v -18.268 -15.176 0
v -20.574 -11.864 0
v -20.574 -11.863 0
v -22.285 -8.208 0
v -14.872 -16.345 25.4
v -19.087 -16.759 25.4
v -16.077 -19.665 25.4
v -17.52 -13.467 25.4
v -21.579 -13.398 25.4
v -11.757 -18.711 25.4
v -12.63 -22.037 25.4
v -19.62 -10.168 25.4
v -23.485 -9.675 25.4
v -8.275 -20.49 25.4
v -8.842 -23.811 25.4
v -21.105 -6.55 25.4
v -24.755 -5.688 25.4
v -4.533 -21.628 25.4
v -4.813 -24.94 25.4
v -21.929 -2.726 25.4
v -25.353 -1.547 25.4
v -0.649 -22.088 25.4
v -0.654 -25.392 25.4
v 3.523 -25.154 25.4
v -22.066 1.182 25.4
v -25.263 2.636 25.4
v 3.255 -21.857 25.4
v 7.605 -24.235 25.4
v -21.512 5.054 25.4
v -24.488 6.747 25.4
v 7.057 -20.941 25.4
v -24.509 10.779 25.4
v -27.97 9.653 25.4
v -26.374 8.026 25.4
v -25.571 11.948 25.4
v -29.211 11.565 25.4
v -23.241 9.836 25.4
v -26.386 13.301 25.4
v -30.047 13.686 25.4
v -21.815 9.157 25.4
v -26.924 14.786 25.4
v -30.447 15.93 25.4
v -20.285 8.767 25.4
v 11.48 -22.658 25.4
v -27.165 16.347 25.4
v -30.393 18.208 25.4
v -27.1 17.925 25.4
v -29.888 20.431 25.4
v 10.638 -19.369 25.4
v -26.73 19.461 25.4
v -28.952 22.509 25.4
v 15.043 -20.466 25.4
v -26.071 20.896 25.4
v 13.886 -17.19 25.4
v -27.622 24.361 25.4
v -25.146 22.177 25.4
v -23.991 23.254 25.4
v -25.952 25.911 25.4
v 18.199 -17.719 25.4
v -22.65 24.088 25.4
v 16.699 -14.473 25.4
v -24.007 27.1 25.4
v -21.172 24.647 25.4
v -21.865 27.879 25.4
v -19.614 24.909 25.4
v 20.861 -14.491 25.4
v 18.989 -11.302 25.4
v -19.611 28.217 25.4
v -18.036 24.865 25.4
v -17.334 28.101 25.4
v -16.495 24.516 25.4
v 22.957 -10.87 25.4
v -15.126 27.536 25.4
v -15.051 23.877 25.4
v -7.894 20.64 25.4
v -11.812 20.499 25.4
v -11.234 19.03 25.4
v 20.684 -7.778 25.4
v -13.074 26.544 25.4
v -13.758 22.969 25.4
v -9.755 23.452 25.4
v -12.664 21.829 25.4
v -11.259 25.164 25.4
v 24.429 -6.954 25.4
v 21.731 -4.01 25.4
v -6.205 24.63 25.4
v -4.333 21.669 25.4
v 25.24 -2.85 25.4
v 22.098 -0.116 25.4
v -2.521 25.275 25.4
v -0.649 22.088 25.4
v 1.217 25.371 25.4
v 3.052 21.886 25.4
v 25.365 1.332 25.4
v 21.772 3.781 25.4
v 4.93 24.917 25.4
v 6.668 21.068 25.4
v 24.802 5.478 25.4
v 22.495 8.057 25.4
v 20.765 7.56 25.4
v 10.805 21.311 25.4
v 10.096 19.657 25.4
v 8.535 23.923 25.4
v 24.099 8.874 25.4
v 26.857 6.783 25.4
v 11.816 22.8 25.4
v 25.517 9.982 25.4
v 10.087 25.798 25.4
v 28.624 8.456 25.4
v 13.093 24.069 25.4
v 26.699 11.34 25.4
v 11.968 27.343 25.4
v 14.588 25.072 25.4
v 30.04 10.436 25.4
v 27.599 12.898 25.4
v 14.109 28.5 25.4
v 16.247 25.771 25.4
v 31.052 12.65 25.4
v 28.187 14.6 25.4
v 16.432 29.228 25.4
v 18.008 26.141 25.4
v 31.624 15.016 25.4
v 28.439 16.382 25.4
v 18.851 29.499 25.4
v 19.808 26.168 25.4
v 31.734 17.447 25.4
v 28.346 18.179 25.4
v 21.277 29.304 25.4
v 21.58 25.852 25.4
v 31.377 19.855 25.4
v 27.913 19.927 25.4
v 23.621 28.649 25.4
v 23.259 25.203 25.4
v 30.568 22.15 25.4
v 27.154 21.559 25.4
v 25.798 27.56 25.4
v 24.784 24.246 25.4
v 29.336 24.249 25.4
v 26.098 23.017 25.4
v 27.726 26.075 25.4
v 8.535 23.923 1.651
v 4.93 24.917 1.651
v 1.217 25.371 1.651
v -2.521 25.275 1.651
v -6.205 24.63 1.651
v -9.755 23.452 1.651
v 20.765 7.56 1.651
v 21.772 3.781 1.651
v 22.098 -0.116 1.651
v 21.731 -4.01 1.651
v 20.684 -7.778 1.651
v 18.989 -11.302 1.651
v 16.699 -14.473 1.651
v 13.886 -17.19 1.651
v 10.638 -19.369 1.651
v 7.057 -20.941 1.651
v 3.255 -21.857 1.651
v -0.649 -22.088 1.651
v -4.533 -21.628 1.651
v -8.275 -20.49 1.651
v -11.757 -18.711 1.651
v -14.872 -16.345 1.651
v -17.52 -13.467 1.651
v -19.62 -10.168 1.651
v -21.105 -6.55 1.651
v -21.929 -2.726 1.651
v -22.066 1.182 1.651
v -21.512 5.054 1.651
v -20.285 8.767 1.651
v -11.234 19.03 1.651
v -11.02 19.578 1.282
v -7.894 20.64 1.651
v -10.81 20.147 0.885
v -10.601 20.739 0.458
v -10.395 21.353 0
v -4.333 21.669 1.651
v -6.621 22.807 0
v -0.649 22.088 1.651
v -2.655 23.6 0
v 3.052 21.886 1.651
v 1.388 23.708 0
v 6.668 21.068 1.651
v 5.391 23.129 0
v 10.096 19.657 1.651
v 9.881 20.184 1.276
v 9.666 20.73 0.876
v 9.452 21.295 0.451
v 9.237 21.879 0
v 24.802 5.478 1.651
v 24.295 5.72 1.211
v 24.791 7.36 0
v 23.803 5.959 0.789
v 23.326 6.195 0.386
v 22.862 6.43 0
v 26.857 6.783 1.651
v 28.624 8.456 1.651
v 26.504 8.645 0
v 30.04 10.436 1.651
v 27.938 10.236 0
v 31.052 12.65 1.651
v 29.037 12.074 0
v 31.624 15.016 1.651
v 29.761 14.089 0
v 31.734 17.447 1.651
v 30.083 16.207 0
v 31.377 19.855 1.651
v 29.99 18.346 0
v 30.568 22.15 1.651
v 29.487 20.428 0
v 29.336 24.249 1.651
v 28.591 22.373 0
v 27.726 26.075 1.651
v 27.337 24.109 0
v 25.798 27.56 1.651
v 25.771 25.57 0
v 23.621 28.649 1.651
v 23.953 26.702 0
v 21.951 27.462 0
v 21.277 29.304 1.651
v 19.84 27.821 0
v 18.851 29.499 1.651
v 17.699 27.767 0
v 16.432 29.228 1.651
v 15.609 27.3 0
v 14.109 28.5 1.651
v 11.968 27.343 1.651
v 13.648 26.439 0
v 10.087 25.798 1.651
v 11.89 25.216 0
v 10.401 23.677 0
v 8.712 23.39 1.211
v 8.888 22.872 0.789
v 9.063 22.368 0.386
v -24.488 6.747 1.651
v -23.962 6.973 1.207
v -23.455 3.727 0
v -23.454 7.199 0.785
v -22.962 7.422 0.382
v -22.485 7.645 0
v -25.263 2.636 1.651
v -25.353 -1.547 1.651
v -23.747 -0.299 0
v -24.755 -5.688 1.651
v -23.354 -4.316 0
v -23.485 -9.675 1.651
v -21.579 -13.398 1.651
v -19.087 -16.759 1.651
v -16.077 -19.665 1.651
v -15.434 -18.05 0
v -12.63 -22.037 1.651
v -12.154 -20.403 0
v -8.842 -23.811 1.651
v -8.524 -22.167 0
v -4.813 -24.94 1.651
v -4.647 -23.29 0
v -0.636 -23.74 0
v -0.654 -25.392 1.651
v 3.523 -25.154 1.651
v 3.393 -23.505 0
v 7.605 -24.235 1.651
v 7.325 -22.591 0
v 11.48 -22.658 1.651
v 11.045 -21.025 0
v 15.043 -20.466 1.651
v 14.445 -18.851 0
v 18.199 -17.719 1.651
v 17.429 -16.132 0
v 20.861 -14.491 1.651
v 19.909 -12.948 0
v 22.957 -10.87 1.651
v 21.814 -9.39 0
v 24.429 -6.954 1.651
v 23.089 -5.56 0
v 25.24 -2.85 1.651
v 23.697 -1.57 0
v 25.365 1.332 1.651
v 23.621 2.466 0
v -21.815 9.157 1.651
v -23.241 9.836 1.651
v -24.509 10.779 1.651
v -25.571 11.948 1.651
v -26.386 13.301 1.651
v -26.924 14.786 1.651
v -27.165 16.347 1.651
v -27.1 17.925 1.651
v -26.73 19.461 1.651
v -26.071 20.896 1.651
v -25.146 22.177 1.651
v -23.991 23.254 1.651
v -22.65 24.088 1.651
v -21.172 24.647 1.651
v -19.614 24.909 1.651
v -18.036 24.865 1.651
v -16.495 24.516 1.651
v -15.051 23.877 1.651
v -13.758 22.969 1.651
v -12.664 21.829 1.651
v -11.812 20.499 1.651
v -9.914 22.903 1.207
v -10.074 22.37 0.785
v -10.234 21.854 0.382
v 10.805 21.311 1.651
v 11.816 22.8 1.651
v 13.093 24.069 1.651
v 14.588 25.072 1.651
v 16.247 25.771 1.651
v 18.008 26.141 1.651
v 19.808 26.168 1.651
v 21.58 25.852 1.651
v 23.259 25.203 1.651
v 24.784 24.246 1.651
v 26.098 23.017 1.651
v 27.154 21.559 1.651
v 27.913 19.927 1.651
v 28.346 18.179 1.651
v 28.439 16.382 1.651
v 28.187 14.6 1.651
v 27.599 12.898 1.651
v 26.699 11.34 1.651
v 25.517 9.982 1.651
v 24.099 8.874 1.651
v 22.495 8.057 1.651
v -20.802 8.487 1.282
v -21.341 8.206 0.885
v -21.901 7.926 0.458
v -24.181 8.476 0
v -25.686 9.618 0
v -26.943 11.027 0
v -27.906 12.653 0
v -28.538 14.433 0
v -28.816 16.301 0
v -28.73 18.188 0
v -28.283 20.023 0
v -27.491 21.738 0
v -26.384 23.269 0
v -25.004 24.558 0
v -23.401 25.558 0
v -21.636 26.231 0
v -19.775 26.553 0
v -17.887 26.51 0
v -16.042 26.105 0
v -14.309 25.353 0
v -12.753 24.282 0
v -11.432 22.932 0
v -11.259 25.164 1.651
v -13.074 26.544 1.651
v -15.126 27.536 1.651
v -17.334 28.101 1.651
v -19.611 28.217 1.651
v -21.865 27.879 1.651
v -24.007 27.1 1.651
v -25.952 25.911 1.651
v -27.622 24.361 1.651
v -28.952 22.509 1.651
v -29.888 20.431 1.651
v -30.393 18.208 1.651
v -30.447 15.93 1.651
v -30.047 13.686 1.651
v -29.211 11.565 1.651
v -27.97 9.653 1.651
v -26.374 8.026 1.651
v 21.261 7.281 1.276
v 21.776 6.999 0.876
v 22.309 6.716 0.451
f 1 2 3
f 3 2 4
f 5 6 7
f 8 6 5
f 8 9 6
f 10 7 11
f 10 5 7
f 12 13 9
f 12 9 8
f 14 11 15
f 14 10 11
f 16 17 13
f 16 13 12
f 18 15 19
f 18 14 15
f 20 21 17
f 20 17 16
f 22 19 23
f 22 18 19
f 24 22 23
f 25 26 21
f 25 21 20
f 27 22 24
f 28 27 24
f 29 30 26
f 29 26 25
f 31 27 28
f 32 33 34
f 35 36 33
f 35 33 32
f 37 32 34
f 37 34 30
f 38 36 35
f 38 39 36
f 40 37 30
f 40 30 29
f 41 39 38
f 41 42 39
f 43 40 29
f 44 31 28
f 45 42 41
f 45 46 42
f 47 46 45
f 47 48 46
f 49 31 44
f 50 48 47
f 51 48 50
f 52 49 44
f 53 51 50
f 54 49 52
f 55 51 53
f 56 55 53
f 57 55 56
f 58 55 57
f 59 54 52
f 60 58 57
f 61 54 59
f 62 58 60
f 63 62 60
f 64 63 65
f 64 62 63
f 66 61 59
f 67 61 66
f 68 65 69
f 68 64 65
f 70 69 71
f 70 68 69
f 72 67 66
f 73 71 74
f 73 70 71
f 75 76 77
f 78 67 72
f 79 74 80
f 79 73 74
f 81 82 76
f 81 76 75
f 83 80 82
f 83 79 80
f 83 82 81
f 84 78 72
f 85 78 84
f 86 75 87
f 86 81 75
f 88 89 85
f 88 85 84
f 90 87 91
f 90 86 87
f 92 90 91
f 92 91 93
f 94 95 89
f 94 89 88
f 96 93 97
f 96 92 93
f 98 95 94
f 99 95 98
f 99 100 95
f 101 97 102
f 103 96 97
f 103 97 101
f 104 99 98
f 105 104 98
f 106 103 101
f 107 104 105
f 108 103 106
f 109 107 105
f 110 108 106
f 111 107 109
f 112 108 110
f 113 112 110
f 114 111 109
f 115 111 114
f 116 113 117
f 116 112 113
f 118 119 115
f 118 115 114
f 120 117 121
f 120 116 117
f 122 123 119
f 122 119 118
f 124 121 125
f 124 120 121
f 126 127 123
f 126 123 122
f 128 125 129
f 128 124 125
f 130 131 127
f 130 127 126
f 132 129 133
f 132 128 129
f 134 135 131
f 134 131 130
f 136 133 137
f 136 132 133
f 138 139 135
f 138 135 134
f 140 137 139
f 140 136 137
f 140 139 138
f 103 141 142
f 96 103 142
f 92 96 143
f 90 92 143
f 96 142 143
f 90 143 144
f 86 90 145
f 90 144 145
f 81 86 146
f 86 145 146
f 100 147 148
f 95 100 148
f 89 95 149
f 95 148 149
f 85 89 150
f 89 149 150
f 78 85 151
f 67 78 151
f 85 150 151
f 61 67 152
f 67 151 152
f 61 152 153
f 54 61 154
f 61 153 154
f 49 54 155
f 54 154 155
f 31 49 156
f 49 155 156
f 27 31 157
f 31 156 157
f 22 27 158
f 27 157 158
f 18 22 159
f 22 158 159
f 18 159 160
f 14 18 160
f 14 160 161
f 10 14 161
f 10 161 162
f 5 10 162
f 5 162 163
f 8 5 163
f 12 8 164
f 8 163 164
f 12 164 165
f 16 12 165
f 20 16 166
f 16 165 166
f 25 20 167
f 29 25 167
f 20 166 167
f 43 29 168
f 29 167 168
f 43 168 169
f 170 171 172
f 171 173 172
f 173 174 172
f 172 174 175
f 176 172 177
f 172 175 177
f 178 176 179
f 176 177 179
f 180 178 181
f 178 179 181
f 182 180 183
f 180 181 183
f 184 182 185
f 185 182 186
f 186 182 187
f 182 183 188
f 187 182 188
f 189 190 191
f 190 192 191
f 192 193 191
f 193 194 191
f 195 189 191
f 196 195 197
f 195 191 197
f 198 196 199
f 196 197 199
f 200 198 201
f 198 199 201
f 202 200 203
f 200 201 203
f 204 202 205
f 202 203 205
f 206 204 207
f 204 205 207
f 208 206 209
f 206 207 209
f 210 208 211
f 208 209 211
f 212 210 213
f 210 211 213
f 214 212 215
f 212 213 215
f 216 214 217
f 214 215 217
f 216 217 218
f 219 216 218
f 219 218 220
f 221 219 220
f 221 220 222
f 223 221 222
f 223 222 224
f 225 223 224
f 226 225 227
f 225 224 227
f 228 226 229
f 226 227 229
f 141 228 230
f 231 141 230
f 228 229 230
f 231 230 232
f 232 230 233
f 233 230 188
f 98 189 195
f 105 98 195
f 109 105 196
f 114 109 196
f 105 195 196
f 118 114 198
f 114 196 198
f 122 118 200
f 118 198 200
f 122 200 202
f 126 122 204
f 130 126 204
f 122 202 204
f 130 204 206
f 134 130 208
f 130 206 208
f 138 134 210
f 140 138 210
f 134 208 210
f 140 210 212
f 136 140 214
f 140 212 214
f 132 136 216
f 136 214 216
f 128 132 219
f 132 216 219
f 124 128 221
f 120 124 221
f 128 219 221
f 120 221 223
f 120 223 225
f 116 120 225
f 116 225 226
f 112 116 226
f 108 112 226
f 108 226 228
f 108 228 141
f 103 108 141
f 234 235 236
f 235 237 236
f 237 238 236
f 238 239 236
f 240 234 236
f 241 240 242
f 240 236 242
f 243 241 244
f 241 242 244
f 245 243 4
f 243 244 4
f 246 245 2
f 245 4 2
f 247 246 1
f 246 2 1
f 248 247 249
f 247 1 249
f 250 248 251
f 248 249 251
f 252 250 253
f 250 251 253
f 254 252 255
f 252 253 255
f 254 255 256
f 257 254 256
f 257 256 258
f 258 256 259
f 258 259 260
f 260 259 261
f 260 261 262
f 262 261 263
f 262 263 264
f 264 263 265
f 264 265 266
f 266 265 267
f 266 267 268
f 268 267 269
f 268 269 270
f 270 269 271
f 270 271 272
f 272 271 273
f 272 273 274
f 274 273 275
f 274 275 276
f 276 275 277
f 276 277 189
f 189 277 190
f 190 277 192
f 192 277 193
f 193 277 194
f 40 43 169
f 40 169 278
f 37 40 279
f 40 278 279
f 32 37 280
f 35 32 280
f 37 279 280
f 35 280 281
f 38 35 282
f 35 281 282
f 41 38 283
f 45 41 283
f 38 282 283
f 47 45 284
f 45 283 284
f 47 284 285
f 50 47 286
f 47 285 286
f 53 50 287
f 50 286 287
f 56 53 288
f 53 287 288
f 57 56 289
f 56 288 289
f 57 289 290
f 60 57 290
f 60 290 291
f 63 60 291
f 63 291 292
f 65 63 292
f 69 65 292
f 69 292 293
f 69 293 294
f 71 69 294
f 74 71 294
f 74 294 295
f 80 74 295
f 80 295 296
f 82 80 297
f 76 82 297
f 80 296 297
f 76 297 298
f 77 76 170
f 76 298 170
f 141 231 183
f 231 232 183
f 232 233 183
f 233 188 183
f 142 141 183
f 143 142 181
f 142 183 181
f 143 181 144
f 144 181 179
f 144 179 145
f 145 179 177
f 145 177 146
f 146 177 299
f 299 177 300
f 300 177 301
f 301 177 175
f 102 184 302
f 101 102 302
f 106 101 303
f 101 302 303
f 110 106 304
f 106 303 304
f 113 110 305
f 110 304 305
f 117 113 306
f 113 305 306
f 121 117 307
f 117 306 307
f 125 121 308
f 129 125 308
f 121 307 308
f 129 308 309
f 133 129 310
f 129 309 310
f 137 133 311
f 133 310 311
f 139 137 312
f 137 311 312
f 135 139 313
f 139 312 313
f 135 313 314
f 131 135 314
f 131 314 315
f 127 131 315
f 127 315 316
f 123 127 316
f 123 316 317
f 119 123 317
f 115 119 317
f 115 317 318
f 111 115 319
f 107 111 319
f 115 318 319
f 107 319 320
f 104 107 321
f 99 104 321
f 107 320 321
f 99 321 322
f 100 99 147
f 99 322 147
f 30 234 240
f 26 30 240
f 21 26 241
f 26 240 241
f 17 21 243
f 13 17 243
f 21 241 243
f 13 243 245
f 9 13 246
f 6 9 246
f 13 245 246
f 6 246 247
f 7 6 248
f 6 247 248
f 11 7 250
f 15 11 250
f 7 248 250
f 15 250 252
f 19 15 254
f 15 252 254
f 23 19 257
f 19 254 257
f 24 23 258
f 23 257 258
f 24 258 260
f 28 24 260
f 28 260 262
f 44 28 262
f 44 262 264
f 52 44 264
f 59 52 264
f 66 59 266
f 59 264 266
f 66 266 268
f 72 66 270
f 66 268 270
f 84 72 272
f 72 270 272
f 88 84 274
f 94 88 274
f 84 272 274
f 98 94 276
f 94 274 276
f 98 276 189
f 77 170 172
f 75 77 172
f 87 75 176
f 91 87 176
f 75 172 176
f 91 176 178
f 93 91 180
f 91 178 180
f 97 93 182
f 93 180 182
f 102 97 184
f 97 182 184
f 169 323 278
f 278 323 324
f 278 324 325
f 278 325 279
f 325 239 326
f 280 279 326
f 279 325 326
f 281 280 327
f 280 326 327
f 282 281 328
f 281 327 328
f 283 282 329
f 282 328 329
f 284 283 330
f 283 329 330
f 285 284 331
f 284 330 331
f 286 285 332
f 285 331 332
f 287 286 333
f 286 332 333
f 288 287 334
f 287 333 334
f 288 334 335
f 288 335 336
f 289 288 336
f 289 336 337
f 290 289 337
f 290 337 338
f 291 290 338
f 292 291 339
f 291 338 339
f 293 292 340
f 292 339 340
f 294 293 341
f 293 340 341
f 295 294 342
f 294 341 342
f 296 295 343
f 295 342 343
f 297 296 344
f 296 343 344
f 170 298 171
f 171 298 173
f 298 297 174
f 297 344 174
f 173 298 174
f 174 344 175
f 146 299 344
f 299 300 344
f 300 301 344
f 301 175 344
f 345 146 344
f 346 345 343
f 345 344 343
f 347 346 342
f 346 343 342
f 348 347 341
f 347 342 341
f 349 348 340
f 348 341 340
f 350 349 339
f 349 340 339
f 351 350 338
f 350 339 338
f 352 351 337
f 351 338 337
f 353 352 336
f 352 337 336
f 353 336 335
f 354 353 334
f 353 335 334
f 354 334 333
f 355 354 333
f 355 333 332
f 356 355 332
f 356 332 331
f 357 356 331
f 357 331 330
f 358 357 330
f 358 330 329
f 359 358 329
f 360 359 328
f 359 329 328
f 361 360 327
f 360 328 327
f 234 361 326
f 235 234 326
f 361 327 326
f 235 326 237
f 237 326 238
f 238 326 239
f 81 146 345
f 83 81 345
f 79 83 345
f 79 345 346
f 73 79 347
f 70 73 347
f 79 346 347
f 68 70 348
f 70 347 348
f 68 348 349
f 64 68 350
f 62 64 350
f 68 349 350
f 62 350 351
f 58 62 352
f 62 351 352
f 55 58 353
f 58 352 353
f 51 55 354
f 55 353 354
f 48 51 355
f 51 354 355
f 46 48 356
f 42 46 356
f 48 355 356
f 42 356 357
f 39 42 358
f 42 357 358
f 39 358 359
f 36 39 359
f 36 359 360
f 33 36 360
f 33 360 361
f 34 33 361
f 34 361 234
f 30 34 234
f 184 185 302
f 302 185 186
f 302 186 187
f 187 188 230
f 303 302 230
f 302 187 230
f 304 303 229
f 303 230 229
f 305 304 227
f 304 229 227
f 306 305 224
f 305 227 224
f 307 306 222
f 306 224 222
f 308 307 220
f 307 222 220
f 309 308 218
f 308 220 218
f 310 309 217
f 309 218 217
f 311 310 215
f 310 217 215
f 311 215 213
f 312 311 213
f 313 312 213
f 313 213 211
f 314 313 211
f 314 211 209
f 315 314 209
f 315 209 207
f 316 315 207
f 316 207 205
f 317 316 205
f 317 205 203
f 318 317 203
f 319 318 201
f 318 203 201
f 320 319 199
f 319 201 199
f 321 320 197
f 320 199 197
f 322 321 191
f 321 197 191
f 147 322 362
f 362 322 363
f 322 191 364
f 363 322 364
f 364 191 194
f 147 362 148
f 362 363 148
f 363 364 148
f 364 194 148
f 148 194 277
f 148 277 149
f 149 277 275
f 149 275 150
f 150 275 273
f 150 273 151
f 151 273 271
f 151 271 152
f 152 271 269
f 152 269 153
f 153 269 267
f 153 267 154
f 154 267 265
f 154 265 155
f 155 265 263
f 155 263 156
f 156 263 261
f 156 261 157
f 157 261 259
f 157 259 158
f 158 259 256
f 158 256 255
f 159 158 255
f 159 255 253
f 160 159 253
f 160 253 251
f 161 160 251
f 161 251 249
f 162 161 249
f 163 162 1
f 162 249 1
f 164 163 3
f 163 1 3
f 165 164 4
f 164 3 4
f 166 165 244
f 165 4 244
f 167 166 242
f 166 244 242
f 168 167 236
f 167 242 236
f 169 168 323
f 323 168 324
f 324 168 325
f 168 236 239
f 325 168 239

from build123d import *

# Parameters (mm, degrees)
F1_DEPTH = 25.4
F2_SIZE  = 1.65099


# Not quite as in the source:
# - a fillet or chamfer is up to 0.001 mm smaller than in the source, because OpenCascade refuses the exact size


with BuildPart() as f1:
    # F0 (on Top) → F1 (new body)
    with BuildSketch(Plane.XY):
        with BuildLine():
            ThreePointArc((24.8022671705, 5.4779141289), (28.575, 25.2007812379), (8.5352328295, 23.9229973153))
            ThreePointArc((8.5352328295, 23.9229973153), (-0.6536534353, 25.3915879217), (-9.754807335, 23.4521584051))
            ThreePointArc((-9.754807335, 23.4521584051), (-27.6224996448, 24.3607548834), (-24.4875679847, 6.7467780603))
            ThreePointArc((-24.4875679847, 6.7467780603), (-0.6536534353, -25.3915879217), (24.8022671705, 5.4779141289))
        make_face()
        with BuildLine():
            ThreePointArc((-20.2845825482, 8.7668303761), (-25.1459996448, 22.1766871761), (-11.2336426791, 19.0296315298))
            ThreePointArc((-11.2336426791, 19.0296315298), (-0.6492677951, 22.0884597772), (10.0965, 19.6566093656))
            ThreePointArc((10.0965, 19.6566093656), (26.0985, 23.0167135306), (20.7645, 7.5602343714))
            ThreePointArc((20.7645, 7.5602343714), (-0.6492677951, -22.0884597772), (-20.2845825482, 8.7668303761))
        make_face(mode=Mode.SUBTRACT)
    extrude(amount=F1_DEPTH)

    # F2 (size 1.651 in the source; OpenCascade refuses exactly that, so slightly less here)
    f2_edges = [f1.edges().sort_by_distance(p)[0] for p in [
        (-0.653653, -25.391588, 0),
        (-0.649268, -22.08846, 0),
        (-25.146, 22.176687, 0),
        (-27.6225, 24.360755, 0),
        (-0.649268, 22.08846, 0),
        (-0.653653, 25.391588, 0),
        (28.575, 25.200781, 0),
        (26.0985, 23.016714, 0),
    ]]
    chamfer(f2_edges, length=F2_SIZE)


solid = f1.part
